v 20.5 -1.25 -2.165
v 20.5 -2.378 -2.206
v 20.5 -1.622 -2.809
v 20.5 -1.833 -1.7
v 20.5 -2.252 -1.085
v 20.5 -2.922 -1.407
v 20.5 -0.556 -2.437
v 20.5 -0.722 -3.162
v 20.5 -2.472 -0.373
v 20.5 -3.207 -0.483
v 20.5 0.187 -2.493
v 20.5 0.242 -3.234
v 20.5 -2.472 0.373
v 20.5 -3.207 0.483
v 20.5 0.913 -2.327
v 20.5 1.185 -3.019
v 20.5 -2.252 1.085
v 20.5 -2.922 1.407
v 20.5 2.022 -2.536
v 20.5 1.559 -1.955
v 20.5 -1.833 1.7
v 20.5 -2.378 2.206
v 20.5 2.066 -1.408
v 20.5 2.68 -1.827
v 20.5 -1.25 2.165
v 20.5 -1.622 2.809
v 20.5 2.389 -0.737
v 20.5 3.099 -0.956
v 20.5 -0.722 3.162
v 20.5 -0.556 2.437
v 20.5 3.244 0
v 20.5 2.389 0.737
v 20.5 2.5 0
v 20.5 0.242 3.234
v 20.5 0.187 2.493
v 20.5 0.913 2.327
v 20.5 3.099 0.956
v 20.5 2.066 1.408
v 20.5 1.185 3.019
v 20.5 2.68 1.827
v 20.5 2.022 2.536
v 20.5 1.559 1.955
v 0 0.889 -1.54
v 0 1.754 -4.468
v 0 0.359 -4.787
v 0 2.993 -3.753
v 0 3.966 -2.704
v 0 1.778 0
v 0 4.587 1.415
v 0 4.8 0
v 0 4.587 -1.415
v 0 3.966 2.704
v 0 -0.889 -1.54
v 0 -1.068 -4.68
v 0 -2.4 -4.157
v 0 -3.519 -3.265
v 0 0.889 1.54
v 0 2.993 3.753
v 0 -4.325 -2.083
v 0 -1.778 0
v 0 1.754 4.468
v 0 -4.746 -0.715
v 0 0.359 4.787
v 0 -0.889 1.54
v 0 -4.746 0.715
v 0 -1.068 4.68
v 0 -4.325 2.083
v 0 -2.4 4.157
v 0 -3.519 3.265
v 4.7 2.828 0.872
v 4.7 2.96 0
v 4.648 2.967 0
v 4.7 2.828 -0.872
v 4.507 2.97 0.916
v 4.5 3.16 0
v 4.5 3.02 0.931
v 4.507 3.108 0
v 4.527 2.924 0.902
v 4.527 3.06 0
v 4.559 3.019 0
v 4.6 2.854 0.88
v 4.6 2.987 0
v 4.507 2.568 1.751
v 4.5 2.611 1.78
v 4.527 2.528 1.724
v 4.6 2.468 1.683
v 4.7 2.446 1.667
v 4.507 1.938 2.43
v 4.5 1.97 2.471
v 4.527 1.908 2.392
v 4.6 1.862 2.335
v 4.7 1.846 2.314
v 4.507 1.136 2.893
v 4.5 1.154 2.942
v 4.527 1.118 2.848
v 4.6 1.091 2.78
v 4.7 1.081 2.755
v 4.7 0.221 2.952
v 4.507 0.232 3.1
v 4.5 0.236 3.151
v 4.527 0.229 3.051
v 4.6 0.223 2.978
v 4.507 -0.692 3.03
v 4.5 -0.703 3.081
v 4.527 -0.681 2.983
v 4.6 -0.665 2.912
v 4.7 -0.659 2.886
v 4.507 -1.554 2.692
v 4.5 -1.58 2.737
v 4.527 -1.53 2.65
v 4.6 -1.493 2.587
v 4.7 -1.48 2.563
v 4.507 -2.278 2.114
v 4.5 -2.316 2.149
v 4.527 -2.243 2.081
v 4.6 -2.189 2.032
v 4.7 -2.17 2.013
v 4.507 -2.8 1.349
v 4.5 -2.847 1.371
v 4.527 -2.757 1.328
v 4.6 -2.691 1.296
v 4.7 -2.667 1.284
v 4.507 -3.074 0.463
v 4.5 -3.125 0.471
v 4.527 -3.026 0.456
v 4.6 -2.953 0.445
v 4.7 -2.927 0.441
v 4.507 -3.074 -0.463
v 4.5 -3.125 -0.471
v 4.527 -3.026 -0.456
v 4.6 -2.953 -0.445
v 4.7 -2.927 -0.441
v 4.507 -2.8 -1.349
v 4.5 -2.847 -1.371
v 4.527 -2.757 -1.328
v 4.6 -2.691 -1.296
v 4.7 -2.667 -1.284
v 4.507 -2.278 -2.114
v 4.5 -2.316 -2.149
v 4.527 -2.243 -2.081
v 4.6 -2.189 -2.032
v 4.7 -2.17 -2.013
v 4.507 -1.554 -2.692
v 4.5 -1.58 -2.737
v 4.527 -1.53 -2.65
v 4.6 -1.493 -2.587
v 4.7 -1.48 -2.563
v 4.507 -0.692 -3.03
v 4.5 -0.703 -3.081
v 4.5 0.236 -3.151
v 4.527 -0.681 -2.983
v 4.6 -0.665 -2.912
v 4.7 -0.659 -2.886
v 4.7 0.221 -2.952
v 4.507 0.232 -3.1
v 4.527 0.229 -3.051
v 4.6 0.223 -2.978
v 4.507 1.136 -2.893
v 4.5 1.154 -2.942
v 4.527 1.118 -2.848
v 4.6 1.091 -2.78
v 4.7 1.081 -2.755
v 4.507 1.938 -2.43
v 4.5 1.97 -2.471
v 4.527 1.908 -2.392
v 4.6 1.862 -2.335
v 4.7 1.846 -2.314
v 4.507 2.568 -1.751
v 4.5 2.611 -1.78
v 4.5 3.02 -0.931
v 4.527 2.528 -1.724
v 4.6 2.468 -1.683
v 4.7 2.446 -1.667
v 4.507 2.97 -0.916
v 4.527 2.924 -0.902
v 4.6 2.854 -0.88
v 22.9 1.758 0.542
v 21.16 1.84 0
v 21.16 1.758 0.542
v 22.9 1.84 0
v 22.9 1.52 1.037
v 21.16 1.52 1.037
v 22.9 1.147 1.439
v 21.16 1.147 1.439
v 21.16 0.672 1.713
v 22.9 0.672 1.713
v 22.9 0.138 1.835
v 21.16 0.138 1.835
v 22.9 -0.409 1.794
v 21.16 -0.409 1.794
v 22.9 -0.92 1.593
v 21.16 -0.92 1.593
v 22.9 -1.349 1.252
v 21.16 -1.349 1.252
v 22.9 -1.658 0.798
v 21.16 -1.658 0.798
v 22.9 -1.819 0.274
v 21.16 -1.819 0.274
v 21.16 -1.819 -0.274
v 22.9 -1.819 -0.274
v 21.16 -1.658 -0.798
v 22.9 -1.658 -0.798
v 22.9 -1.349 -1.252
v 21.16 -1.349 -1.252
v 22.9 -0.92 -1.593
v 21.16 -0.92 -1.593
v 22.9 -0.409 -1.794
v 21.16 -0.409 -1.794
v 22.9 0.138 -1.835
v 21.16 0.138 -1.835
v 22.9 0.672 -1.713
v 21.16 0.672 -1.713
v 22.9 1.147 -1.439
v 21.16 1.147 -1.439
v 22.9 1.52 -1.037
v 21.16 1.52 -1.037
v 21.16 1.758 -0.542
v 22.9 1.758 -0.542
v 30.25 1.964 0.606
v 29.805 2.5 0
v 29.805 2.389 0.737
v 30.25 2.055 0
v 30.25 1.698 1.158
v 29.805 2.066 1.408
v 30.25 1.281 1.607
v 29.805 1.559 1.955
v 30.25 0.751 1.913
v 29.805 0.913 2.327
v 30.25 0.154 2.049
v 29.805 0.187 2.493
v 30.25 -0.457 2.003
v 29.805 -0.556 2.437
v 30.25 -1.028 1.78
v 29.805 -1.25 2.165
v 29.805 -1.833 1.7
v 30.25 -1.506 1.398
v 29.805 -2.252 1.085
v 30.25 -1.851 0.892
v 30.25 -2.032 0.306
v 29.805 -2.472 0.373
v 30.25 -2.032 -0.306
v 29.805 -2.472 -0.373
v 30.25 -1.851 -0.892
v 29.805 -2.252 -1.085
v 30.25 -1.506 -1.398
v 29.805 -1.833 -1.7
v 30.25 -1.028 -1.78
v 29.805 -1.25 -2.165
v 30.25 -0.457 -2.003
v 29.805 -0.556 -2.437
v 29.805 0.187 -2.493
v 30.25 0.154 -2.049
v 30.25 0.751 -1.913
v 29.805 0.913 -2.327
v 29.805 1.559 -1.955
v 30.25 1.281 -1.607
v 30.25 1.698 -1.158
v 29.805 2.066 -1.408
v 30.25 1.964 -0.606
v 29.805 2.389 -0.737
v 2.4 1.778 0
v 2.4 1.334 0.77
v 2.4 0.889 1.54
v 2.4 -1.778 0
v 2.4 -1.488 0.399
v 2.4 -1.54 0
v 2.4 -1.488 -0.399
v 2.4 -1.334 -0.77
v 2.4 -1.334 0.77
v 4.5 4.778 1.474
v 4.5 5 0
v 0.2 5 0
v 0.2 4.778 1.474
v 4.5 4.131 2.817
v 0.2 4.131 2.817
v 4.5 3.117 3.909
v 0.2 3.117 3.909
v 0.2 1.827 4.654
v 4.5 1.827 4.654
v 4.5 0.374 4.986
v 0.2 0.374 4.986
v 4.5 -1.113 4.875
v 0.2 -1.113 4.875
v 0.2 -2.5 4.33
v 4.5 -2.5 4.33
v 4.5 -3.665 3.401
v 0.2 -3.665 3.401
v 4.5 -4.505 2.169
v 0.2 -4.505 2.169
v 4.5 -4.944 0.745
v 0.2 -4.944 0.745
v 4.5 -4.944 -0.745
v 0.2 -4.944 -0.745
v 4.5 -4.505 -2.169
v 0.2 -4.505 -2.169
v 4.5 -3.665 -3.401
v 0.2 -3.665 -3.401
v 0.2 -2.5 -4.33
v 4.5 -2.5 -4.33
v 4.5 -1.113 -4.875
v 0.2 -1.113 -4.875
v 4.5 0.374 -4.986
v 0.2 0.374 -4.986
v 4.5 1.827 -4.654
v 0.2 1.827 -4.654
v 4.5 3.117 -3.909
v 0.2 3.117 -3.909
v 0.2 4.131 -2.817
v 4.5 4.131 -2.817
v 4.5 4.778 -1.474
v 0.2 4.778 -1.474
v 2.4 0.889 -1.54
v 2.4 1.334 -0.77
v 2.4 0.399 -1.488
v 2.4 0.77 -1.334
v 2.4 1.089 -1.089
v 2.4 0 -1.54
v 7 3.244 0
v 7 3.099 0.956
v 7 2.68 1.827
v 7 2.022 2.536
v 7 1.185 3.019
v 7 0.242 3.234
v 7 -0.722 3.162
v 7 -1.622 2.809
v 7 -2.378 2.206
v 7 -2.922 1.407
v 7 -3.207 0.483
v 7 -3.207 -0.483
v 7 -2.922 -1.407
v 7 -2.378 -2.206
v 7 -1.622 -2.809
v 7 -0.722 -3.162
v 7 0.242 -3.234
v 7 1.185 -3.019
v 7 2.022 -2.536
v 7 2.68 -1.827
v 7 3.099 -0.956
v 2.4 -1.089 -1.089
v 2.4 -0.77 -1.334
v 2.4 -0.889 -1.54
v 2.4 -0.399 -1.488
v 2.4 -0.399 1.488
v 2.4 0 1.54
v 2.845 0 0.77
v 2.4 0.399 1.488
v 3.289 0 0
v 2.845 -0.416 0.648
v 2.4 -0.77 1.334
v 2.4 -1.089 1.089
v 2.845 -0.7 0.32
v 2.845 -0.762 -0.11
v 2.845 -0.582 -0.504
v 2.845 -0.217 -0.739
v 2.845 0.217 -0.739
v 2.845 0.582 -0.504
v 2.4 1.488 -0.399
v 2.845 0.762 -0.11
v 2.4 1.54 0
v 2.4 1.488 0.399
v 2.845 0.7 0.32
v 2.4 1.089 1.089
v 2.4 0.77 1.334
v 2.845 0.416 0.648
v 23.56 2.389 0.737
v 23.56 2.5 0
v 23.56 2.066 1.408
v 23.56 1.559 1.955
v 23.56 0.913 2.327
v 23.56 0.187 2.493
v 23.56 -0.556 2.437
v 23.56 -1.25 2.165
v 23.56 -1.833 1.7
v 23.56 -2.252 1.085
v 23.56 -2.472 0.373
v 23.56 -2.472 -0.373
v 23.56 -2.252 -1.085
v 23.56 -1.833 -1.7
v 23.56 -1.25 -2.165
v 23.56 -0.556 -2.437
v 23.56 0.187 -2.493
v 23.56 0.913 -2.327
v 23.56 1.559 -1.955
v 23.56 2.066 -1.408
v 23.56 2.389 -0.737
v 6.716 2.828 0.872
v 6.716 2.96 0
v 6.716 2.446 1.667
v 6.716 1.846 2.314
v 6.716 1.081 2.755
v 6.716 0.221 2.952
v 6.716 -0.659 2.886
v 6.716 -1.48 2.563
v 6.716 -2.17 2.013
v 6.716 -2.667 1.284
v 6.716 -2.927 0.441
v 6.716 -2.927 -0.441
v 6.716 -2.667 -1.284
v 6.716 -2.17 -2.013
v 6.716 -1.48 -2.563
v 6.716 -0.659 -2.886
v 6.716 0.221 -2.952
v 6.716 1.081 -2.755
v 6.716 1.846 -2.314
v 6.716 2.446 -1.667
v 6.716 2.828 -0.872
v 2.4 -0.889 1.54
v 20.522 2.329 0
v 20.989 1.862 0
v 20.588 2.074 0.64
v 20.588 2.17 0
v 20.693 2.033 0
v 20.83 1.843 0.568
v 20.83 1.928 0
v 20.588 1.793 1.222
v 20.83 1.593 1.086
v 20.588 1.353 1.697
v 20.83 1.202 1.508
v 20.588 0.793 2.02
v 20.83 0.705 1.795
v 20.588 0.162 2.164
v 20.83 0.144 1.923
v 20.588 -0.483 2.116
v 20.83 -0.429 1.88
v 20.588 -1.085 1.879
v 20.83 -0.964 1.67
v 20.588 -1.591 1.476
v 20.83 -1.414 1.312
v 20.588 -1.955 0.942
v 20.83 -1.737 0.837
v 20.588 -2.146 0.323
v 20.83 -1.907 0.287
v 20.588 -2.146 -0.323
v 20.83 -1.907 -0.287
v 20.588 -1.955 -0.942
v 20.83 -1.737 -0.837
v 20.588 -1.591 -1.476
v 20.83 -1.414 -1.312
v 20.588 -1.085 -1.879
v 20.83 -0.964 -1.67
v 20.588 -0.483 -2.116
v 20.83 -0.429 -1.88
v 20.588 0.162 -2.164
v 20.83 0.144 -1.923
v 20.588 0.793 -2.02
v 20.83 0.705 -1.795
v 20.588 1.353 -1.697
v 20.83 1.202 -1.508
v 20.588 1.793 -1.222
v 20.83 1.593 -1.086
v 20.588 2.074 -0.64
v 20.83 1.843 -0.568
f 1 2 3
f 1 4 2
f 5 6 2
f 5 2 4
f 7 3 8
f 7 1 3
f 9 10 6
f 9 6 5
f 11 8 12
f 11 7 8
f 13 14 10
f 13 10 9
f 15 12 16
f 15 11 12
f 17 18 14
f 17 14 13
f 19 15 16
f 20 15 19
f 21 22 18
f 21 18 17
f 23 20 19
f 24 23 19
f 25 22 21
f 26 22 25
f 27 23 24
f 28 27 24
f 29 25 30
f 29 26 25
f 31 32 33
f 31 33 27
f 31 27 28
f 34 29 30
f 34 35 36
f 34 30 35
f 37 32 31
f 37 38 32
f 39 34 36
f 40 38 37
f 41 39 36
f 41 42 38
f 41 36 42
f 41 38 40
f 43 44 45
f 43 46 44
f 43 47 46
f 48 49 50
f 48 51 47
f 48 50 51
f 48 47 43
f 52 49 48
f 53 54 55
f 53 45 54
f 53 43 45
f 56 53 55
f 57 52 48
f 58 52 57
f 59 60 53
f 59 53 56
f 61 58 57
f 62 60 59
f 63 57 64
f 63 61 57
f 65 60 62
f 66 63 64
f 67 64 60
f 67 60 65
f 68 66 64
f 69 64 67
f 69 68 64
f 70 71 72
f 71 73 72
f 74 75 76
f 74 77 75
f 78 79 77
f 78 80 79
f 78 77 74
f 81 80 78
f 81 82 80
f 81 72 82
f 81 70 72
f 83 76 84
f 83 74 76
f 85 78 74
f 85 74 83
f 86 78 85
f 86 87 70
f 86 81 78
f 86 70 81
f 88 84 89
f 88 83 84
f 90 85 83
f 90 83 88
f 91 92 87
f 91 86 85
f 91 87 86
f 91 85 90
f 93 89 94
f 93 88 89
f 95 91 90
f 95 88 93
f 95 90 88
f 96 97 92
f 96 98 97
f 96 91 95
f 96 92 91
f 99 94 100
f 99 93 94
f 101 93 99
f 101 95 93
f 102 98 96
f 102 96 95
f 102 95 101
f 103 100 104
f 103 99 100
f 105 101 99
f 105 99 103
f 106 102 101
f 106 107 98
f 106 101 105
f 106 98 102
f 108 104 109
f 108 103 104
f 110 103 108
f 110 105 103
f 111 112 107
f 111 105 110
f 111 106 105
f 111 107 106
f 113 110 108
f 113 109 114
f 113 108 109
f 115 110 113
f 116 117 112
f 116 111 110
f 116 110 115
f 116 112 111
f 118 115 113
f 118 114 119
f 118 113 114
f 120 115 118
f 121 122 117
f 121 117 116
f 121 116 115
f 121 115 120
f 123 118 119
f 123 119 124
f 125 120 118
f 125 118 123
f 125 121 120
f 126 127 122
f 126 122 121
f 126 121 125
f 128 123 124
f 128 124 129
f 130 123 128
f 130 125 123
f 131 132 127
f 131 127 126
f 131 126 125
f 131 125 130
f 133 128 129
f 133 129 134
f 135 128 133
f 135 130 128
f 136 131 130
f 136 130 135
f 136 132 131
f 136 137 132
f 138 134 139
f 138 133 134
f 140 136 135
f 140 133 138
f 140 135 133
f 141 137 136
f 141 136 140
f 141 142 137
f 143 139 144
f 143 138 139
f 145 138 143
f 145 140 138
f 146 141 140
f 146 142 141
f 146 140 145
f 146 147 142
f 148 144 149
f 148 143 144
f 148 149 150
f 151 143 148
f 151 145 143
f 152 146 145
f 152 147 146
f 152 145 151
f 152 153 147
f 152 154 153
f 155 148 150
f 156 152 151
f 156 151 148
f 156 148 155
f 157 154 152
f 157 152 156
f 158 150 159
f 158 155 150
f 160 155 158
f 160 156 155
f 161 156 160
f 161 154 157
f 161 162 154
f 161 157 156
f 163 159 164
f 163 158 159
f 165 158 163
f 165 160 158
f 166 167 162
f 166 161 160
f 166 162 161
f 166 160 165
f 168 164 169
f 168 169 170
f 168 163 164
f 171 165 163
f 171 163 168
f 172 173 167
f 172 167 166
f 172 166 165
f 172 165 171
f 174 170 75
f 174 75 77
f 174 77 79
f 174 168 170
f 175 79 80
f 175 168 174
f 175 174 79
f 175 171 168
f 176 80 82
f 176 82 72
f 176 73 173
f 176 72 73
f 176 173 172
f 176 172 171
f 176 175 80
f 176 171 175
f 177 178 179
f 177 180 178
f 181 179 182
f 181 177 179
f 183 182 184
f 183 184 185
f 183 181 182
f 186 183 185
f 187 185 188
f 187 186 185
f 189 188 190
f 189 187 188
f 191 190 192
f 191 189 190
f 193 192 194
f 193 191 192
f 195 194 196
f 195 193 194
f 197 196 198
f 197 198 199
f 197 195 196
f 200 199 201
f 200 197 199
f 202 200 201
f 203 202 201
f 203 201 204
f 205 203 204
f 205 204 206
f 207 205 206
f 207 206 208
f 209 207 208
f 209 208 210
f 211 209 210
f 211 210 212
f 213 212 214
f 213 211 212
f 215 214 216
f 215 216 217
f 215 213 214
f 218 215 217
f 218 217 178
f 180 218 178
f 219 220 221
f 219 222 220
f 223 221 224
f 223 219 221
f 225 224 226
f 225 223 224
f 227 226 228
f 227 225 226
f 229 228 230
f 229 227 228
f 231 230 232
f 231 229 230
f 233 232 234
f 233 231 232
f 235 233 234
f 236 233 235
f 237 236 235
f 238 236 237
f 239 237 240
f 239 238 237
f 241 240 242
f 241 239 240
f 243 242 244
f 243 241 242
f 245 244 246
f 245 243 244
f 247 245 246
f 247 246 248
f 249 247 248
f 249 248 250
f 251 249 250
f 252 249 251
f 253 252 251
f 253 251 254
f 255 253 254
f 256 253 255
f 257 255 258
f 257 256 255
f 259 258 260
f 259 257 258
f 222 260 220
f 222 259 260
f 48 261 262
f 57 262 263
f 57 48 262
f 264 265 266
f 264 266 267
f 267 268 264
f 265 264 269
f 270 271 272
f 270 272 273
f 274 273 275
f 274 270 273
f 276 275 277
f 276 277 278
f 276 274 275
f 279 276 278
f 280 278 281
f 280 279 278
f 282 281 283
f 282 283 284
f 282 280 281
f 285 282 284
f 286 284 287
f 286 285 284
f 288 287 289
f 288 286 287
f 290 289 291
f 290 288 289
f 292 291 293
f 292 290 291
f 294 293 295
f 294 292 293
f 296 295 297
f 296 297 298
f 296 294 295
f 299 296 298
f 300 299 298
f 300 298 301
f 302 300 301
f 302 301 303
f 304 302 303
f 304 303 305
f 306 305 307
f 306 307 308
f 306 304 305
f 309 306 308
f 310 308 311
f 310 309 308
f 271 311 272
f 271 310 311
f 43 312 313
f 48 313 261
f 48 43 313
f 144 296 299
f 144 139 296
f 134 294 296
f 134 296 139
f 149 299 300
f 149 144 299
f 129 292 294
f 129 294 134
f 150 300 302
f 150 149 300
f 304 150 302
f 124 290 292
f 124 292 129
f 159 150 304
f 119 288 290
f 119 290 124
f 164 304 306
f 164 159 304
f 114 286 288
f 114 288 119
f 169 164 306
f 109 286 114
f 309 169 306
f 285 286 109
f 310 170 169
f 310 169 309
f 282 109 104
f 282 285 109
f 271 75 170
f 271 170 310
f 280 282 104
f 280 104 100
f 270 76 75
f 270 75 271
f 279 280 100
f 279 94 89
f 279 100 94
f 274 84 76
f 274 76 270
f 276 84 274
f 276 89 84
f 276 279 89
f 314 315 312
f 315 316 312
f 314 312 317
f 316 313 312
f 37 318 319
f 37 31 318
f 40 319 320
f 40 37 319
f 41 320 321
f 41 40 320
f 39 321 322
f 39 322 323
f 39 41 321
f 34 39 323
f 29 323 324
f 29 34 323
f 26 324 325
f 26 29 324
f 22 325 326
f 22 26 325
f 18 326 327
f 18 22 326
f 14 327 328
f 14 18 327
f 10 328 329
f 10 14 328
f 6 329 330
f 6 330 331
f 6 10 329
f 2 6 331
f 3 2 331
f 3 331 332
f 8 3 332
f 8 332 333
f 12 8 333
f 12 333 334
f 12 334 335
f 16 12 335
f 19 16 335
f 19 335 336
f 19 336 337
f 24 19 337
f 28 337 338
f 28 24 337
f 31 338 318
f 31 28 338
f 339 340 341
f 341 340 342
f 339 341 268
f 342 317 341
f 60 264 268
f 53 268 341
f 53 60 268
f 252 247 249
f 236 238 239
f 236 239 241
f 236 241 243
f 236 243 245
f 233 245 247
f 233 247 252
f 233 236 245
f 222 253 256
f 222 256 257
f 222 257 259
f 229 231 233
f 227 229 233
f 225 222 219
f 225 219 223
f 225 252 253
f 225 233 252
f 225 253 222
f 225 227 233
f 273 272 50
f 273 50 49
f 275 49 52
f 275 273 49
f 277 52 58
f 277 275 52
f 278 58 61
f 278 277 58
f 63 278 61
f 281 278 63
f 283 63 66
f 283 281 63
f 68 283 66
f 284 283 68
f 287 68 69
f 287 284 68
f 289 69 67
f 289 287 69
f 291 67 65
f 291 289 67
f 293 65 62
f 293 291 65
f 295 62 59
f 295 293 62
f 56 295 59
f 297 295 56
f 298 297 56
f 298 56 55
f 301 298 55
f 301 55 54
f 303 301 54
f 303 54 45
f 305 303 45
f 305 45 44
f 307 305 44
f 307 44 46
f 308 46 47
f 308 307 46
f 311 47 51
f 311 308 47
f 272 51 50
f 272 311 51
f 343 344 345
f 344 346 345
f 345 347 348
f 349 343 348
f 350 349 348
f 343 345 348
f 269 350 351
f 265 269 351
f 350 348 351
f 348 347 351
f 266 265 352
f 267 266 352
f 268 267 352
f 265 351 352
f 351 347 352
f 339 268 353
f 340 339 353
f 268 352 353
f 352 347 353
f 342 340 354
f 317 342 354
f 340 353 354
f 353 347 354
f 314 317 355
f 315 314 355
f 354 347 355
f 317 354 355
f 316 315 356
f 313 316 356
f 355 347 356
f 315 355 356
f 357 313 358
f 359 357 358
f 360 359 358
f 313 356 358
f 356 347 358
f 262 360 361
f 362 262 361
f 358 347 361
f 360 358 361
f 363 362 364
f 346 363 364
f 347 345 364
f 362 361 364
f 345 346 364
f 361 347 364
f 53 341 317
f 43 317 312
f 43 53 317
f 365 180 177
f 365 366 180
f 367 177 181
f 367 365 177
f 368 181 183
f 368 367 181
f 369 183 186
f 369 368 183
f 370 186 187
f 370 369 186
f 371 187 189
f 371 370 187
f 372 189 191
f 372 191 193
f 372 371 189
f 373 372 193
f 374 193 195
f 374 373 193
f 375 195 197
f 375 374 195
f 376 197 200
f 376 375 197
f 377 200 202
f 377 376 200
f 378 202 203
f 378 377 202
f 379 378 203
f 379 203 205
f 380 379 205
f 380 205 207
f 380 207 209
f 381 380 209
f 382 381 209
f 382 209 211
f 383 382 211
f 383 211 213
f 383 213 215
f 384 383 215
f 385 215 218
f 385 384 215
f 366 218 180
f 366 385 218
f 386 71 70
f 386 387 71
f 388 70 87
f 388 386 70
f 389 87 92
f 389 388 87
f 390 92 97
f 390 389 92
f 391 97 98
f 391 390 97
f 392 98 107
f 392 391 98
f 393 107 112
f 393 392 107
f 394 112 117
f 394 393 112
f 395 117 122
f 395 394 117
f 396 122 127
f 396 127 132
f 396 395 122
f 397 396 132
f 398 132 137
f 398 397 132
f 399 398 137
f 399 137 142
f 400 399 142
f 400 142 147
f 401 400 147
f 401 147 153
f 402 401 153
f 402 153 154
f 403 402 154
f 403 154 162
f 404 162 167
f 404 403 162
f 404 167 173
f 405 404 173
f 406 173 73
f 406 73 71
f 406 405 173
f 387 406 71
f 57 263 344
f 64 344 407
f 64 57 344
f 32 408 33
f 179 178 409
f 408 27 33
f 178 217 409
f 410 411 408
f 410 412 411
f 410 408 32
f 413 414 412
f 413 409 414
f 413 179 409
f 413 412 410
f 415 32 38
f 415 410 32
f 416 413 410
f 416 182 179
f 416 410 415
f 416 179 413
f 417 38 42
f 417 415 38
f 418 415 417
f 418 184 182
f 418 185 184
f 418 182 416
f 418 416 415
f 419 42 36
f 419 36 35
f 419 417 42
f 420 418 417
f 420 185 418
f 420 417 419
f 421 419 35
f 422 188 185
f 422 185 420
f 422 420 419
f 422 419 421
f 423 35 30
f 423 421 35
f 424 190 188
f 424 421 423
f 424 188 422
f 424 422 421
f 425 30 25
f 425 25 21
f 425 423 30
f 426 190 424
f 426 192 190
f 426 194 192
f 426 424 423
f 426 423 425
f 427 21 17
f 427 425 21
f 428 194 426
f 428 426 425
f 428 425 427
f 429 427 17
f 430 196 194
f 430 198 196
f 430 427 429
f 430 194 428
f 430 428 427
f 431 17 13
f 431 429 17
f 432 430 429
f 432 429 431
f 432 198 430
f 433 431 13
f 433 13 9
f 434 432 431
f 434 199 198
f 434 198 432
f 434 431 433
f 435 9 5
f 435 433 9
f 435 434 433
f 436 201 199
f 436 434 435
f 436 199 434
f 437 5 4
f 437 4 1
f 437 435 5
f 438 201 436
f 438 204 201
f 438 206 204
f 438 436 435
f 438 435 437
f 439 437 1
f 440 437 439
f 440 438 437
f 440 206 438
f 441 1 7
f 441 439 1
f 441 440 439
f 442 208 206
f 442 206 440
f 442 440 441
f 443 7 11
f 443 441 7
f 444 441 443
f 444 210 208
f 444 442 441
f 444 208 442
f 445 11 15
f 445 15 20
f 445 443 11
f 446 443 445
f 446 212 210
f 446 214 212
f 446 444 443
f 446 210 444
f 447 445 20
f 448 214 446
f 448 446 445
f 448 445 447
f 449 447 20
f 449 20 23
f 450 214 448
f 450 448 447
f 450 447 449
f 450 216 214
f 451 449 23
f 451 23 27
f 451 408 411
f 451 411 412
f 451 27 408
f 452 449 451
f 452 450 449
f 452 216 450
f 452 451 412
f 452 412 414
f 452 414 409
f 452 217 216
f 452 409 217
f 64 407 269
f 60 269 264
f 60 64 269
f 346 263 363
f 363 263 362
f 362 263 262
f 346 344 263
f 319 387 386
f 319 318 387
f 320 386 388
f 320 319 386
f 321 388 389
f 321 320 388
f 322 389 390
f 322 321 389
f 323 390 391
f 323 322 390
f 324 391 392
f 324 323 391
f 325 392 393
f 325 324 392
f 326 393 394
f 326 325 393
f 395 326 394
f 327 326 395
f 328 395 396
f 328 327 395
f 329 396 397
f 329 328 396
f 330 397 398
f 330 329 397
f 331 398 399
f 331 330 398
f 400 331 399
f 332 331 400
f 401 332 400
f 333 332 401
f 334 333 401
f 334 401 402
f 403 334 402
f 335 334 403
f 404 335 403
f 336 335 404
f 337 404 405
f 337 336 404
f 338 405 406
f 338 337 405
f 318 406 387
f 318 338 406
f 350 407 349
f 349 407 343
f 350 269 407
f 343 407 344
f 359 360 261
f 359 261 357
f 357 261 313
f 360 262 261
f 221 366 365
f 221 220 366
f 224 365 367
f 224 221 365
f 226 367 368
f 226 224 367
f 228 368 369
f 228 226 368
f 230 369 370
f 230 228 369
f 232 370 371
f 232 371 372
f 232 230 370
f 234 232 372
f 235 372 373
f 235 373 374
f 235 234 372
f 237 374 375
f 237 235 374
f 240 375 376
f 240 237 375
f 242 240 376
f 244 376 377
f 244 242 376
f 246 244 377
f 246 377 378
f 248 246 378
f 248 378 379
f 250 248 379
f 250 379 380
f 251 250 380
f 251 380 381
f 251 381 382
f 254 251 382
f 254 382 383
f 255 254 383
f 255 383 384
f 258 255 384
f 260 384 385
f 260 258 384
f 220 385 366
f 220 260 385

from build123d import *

# Parameters (mm, degrees)
CHAMFER1_SIZE = 0.2
HEX_2_DEPTH   = 2.4


# Read off the part's stored shape, not the designer's step: ThreadSchematic
with BuildPart() as part:
    # ThreadSchematic outline → ThreadSchematic (revolve)
    with BuildSketch(Plane.YX):
        with BuildLine():
            Line((0, 30.25), (0, 0))
            Line((0, 0), (5, 0))
            Line((5, 0), (5, 4.5))
            Line((5, 4.5), (3.16, 4.5))
            ThreePointArc((3.16, 4.5), (3.018578644, 4.558578644), (2.96, 4.7))
            Line((2.96, 4.7), (2.96, 6.7165))
            Line((2.96, 6.7165), (3.2435, 7))
            Line((3.2435, 7), (3.2435, 20.5))
            Line((3.2435, 20.5), (2.5, 20.5))
            ThreePointArc((2.5, 20.5), (2.033309524, 20.693309524), (1.84, 21.16))
            Line((1.84, 21.16), (1.84, 22.9))
            Line((1.84, 22.9), (2.5, 23.56))
            Line((2.5, 23.56), (2.5, 29.805))
            Line((2.5, 29.805), (2.055, 30.25))
            Line((2.055, 30.25), (0, 30.25))
        make_face()
    revolve(axis=Axis((0, 0, 0), (1, 0, 0)))

    # Chamfer1
    chamfer1_edges = [part.edges().sort_by_distance(p)[0] for p in [
        (0, -5, 0),
    ]]
    chamfer(chamfer1_edges, length=CHAMFER1_SIZE)

    # Sketch2 → PreBroach (revolve, cut)
    with BuildSketch(Plane.XY, mode=Mode.PRIVATE) as prebroach_sk:
        Polygon((0, 1.54), (2.4, 1.54), (3.289119415, 0), (0, 0), align=None)
    revolve(prebroach_sk.sketch.rotate(Axis((0, 0, 0), (1, 0, 0)), 90), axis=Axis((0, 0, 0), (1, 0, 0)), mode=Mode.SUBTRACT)

    # Sketch3 → Hex 2 (cut)
    with BuildSketch(Plane.ZY):
        Polygon((-1.54, -0.889119415), (-1.54, 0.889119415), (0, 1.778238829), (1.54, 0.889119415), (1.54, -0.889119415), (0, -1.778238829), align=None)
    extrude(amount=-HEX_2_DEPTH, mode=Mode.SUBTRACT)


solid = part.part
